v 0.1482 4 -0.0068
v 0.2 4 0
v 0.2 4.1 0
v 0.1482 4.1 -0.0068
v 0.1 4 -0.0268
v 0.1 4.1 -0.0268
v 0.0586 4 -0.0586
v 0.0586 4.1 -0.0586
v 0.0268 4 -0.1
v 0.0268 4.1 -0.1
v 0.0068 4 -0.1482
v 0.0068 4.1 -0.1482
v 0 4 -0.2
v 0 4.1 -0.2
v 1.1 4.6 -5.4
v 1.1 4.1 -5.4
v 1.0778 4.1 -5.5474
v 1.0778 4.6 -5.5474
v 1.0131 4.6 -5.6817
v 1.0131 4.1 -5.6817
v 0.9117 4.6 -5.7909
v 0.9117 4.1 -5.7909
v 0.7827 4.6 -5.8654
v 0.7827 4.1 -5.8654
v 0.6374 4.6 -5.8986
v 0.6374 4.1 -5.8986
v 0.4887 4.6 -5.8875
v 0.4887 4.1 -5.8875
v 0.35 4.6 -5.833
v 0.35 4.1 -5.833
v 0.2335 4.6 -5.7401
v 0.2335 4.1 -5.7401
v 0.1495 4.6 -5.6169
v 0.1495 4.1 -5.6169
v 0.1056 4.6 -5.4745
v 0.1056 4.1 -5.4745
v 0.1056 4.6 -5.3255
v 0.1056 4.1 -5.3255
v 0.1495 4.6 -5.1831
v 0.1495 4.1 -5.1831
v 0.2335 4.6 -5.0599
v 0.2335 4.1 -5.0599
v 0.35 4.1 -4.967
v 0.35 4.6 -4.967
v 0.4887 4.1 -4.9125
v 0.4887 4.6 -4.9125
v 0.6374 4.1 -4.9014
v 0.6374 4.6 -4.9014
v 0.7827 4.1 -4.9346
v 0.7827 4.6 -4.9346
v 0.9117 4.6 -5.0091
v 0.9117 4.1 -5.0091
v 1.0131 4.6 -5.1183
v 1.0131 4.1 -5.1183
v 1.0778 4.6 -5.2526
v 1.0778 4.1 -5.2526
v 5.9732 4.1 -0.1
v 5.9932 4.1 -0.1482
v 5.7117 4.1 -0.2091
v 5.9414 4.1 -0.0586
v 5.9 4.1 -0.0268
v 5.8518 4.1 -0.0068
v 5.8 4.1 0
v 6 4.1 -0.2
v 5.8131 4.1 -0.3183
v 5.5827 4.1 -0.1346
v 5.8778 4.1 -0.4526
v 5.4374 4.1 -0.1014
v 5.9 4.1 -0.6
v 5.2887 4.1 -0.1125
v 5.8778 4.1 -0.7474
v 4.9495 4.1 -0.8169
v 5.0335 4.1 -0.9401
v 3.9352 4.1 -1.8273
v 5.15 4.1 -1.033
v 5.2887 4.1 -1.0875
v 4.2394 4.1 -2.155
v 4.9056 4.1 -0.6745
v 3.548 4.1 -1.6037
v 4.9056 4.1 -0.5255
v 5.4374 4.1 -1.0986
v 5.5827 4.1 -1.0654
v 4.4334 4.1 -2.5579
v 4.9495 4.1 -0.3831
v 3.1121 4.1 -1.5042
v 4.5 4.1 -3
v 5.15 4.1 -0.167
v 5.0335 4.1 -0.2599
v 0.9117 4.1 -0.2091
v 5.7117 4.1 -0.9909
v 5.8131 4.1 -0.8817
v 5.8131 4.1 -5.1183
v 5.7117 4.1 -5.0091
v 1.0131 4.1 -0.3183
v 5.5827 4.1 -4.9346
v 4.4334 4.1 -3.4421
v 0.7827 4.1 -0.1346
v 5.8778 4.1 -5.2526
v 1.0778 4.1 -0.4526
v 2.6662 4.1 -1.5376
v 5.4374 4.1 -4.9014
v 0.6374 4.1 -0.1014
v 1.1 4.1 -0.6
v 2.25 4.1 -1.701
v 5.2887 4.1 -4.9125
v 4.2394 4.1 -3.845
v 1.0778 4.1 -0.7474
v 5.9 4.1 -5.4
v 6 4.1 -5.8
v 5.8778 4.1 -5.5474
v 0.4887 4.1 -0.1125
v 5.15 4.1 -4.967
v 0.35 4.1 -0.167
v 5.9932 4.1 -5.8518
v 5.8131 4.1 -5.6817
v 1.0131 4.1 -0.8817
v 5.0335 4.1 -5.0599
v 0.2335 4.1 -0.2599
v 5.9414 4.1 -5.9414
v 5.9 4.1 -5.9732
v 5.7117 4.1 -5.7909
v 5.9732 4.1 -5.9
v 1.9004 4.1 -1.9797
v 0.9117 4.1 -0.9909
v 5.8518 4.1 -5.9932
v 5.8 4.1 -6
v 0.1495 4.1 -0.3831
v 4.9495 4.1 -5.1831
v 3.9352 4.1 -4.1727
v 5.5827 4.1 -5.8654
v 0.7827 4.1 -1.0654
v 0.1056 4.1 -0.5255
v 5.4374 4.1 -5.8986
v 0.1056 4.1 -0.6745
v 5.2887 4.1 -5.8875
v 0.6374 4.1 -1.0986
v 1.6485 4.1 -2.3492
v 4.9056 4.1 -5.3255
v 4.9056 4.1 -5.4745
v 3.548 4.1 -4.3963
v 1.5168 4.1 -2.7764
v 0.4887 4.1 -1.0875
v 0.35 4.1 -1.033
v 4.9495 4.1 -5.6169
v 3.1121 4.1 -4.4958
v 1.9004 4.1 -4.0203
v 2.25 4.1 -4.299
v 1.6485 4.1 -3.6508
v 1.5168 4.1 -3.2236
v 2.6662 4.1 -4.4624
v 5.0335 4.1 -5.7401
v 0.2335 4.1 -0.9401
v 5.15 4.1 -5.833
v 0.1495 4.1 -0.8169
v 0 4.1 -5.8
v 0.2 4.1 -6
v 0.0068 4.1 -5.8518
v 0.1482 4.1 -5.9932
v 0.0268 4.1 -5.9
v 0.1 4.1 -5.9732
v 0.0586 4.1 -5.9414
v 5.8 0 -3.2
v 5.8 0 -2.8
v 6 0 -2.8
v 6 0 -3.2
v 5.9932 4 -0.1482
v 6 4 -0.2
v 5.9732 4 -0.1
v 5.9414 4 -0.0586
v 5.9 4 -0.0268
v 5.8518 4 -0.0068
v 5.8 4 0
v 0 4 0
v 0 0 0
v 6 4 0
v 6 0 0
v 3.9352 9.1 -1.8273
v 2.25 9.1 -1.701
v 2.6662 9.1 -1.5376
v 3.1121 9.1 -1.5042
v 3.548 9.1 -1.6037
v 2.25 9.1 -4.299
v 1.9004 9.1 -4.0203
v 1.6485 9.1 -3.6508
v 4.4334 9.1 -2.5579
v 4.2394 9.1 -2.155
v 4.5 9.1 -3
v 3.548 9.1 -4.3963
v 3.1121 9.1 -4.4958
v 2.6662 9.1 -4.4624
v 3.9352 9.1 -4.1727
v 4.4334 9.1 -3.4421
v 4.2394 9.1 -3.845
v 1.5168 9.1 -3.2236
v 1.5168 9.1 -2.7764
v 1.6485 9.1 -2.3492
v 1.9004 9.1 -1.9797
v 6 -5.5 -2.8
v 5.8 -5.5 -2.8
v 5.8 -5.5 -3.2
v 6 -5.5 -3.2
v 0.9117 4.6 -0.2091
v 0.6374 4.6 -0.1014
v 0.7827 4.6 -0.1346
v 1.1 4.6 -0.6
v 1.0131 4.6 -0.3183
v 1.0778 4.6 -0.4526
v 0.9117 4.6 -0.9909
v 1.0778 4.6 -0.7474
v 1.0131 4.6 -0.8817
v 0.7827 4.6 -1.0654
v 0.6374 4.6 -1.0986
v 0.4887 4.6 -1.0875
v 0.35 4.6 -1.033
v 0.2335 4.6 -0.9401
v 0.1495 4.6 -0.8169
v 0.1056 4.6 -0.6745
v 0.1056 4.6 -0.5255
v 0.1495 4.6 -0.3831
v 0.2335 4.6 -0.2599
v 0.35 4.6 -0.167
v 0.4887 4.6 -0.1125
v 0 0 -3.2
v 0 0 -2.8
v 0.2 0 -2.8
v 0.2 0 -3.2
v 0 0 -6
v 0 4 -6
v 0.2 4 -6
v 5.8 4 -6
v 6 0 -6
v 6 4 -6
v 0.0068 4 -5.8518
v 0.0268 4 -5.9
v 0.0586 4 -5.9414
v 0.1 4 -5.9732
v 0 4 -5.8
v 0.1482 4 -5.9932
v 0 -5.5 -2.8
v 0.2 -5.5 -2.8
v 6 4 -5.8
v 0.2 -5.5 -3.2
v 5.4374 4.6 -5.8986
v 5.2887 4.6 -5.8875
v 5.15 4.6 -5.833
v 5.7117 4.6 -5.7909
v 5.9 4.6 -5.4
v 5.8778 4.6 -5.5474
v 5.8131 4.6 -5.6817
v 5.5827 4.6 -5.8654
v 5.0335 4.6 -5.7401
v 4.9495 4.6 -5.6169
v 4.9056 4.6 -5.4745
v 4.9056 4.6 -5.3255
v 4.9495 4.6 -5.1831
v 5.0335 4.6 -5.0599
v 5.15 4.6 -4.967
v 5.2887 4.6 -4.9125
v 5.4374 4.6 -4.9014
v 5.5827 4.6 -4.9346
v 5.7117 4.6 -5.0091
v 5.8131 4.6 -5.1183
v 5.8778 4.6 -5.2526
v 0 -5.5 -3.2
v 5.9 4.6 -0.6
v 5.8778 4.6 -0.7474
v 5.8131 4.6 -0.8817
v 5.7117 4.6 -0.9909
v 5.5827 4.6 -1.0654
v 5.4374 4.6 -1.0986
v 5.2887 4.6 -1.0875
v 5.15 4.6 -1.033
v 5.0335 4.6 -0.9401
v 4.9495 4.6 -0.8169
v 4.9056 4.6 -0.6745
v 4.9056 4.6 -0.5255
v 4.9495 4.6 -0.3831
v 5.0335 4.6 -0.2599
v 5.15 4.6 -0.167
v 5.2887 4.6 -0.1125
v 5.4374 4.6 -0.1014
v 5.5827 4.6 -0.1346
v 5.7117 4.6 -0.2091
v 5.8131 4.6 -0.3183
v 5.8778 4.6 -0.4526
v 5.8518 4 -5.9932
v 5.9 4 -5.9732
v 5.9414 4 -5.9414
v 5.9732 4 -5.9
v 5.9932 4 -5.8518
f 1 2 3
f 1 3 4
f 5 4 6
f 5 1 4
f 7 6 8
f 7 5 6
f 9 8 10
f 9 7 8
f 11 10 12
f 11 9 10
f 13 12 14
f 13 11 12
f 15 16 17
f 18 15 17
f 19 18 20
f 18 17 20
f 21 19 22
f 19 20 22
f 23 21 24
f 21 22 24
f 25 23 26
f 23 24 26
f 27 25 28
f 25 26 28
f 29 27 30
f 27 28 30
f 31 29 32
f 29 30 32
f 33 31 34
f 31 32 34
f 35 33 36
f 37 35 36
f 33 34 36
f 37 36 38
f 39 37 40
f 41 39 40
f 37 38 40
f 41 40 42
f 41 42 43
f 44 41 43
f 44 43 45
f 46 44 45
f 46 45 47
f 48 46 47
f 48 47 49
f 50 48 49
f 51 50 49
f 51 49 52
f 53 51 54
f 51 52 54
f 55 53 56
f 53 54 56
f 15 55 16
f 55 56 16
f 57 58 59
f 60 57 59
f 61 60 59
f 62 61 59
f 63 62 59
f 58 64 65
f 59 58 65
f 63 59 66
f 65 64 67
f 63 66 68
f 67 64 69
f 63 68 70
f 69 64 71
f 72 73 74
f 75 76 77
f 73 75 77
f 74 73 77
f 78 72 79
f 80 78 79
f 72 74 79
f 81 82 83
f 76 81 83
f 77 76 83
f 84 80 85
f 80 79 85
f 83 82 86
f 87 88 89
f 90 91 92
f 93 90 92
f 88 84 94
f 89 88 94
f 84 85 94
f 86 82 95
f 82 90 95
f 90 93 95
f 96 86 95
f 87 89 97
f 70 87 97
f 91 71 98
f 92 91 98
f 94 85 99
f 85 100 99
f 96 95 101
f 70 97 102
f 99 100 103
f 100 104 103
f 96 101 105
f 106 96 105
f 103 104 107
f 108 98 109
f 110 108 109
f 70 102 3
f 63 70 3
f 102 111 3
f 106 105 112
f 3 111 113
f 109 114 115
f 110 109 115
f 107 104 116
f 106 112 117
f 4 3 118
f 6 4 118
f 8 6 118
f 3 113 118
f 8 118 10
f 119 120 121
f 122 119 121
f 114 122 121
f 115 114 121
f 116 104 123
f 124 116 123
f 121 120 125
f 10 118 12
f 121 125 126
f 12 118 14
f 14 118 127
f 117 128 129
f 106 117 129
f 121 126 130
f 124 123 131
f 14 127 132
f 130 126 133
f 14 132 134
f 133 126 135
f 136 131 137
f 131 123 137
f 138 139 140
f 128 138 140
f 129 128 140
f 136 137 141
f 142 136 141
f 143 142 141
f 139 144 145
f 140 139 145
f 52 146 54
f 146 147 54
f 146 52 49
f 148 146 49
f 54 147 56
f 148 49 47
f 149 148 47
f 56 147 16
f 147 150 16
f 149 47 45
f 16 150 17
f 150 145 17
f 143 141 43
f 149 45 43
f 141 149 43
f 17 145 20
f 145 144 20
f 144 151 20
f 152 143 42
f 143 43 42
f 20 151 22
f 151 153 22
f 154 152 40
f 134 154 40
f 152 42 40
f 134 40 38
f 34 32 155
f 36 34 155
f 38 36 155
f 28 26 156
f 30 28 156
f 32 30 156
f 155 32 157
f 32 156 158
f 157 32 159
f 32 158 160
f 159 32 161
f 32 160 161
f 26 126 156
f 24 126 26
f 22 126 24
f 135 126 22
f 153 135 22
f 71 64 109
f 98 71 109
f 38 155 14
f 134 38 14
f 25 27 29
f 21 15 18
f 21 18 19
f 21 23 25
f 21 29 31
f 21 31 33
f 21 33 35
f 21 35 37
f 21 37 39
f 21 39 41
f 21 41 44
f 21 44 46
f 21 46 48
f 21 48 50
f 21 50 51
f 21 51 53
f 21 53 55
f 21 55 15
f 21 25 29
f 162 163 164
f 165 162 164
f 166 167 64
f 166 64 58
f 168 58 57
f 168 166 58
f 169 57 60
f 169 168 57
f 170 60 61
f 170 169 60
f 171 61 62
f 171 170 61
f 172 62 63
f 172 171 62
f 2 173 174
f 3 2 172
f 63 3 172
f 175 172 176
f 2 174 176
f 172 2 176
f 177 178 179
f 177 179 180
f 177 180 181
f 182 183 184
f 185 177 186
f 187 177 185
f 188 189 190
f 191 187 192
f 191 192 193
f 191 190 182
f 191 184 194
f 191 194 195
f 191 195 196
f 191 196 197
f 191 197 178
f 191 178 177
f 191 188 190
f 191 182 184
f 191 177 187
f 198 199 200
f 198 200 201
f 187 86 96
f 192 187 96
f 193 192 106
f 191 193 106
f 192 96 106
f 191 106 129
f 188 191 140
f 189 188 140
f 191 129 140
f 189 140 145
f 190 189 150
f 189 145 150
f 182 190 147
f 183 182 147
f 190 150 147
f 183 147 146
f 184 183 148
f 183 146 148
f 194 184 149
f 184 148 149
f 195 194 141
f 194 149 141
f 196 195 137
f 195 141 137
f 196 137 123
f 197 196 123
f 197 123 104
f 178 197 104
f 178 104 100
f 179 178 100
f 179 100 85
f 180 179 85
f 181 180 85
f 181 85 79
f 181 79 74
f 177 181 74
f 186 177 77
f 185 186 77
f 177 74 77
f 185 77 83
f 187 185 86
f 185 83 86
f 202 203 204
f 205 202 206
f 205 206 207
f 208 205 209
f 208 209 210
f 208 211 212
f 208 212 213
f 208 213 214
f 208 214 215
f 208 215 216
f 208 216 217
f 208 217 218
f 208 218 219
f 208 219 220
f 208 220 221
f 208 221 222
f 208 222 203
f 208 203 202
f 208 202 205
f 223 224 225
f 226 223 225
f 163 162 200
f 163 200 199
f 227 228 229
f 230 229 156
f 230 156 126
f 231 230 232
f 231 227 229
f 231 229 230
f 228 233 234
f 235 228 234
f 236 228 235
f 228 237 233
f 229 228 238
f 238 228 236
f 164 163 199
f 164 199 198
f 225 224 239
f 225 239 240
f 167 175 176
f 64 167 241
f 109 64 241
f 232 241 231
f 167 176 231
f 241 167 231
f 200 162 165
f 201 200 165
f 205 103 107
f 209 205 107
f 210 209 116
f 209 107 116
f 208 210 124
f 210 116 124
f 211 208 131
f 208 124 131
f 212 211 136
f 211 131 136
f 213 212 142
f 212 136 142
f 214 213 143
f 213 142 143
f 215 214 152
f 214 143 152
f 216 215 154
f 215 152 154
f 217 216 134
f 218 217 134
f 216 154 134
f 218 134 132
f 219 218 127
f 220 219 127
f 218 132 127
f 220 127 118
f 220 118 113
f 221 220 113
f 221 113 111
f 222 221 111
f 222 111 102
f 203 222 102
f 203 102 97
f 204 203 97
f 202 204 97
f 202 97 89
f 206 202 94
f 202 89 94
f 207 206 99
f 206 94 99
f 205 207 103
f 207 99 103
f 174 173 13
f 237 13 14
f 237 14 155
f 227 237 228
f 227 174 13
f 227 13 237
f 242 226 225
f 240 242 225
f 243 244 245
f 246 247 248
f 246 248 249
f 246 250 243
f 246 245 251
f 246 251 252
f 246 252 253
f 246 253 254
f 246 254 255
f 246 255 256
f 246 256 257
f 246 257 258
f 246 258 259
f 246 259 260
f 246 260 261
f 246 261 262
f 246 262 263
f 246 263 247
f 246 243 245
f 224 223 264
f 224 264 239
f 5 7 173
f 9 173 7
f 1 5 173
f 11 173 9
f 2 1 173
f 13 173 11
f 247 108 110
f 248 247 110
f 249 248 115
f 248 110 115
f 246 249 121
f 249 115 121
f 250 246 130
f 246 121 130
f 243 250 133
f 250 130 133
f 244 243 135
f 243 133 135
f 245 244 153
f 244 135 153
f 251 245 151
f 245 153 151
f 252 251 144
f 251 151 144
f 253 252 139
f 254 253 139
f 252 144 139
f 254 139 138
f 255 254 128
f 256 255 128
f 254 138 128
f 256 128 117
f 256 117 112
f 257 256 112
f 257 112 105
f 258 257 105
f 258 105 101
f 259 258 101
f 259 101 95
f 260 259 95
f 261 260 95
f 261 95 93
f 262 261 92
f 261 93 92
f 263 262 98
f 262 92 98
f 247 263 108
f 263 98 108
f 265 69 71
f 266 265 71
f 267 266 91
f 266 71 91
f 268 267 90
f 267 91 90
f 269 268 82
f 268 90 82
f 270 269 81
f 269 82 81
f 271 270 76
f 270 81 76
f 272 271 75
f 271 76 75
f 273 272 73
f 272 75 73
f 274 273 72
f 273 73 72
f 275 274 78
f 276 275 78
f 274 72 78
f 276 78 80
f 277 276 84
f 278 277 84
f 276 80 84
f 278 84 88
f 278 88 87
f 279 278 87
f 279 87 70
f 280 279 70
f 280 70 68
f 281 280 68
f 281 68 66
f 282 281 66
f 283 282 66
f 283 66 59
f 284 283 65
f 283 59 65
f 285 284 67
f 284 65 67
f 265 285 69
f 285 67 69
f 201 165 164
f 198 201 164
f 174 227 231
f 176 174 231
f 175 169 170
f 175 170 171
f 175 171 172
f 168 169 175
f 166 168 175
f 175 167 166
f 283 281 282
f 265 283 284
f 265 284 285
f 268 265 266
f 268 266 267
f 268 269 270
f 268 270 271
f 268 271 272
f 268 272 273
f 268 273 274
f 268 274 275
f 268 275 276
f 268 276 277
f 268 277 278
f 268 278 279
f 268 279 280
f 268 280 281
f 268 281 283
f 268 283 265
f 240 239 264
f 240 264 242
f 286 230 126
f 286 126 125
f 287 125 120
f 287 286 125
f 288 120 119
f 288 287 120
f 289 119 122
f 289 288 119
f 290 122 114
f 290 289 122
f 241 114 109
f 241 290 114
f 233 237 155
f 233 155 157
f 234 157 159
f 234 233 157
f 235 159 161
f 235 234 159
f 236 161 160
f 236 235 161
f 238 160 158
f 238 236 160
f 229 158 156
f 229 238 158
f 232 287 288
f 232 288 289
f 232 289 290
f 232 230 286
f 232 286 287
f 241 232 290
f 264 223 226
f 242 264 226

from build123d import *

# Parameters (mm, degrees)
SKETCH1_W             = 6
SKETCH1_H             = 6
BOSS_EXTRUDE1_DEPTH   = 4
BOSS_EXTRUDE2_DEPTH   = 0.1
SKETCH4_R             = 0.5
BOSS_EXTRUDE3_DEPTH   = 0.5
SKETCH5_R             = 1.5
BOSS_EXTRUDE4_DEPTH   = 5
SKETCH6_W             = 0.2
SKETCH6_H             = 0.4
BOSS_EXTRUDE5_DEPTH   = 5.5
BOSS_EXTRUDE5_2_DEPTH = 5.5


with BuildPart() as part:
    # Sketch1 → Boss-Extrude1 (new body)
    with BuildSketch(Plane(origin=(0, 0, 0), x_dir=(1, 0, 0), z_dir=(0, 1, 0))):
        with Locations((3, 3)):
            Rectangle(SKETCH1_W, SKETCH1_H)
    extrude(amount=BOSS_EXTRUDE1_DEPTH)

    # Sketch2 → Boss-Extrude2 (add)
    with BuildSketch(Plane(origin=(0, 4, 0), x_dir=(1, 0, 0), z_dir=(0, 1, 0))):
        with BuildLine():
            Line((0.2, 6), (5.8, 6))
            ThreePointArc((5.8, 6), (5.941421356, 5.941421356), (6, 5.8))
            Line((6, 5.8), (6, 0.2))
            ThreePointArc((6, 0.2), (5.941421356, 0.058578644), (5.8, 0))
            Line((5.8, 0), (0.2, 0))
            ThreePointArc((0.2, 0), (0.058578644, 0.058578644), (0, 0.2))
            Line((0, 0.2), (0, 5.8))
            ThreePointArc((0, 5.8), (0.058578644, 5.941421356), (0.2, 6))
        make_face()
    extrude(amount=BOSS_EXTRUDE2_DEPTH)

    # Sketch4 → Boss-Extrude3 (add)
    with BuildSketch(Plane(origin=(0, 4.1, 0), x_dir=(1, 0, 0), z_dir=(0, 1, 0))):
        with Locations((0.6, 5.4)):
            Circle(SKETCH4_R)
        with Locations((5.4, 5.4)):
            Circle(SKETCH4_R)
        with Locations((5.4, 0.6)):
            Circle(SKETCH4_R)
        with Locations((0.6, 0.6)):
            Circle(SKETCH4_R)
    extrude(amount=BOSS_EXTRUDE3_DEPTH)

    # Sketch5 → Boss-Extrude4 (add)
    with BuildSketch(Plane(origin=(0, 4.1, 0), x_dir=(1, 0, 0), z_dir=(0, 1, 0))):
        with Locations((3, 3)):
            Circle(SKETCH5_R)
    extrude(amount=BOSS_EXTRUDE4_DEPTH)


with BuildPart() as body_2:
    # Sketch6 → Boss-Extrude5 (new body)
    with BuildSketch(Plane.XZ):
        with Locations((0.1, -3)):
            Rectangle(SKETCH6_W, SKETCH6_H)
    extrude(amount=BOSS_EXTRUDE5_DEPTH)


with BuildPart() as body_3:
    # Sketch6 → Boss-Extrude5 2 (new body)
    with BuildSketch(Plane.XZ):
        with Locations((5.9, -3)):
            Rectangle(SKETCH6_W, SKETCH6_H)
    extrude(amount=BOSS_EXTRUDE5_2_DEPTH)


solid = Compound([part.part, body_2.part, body_3.part])
